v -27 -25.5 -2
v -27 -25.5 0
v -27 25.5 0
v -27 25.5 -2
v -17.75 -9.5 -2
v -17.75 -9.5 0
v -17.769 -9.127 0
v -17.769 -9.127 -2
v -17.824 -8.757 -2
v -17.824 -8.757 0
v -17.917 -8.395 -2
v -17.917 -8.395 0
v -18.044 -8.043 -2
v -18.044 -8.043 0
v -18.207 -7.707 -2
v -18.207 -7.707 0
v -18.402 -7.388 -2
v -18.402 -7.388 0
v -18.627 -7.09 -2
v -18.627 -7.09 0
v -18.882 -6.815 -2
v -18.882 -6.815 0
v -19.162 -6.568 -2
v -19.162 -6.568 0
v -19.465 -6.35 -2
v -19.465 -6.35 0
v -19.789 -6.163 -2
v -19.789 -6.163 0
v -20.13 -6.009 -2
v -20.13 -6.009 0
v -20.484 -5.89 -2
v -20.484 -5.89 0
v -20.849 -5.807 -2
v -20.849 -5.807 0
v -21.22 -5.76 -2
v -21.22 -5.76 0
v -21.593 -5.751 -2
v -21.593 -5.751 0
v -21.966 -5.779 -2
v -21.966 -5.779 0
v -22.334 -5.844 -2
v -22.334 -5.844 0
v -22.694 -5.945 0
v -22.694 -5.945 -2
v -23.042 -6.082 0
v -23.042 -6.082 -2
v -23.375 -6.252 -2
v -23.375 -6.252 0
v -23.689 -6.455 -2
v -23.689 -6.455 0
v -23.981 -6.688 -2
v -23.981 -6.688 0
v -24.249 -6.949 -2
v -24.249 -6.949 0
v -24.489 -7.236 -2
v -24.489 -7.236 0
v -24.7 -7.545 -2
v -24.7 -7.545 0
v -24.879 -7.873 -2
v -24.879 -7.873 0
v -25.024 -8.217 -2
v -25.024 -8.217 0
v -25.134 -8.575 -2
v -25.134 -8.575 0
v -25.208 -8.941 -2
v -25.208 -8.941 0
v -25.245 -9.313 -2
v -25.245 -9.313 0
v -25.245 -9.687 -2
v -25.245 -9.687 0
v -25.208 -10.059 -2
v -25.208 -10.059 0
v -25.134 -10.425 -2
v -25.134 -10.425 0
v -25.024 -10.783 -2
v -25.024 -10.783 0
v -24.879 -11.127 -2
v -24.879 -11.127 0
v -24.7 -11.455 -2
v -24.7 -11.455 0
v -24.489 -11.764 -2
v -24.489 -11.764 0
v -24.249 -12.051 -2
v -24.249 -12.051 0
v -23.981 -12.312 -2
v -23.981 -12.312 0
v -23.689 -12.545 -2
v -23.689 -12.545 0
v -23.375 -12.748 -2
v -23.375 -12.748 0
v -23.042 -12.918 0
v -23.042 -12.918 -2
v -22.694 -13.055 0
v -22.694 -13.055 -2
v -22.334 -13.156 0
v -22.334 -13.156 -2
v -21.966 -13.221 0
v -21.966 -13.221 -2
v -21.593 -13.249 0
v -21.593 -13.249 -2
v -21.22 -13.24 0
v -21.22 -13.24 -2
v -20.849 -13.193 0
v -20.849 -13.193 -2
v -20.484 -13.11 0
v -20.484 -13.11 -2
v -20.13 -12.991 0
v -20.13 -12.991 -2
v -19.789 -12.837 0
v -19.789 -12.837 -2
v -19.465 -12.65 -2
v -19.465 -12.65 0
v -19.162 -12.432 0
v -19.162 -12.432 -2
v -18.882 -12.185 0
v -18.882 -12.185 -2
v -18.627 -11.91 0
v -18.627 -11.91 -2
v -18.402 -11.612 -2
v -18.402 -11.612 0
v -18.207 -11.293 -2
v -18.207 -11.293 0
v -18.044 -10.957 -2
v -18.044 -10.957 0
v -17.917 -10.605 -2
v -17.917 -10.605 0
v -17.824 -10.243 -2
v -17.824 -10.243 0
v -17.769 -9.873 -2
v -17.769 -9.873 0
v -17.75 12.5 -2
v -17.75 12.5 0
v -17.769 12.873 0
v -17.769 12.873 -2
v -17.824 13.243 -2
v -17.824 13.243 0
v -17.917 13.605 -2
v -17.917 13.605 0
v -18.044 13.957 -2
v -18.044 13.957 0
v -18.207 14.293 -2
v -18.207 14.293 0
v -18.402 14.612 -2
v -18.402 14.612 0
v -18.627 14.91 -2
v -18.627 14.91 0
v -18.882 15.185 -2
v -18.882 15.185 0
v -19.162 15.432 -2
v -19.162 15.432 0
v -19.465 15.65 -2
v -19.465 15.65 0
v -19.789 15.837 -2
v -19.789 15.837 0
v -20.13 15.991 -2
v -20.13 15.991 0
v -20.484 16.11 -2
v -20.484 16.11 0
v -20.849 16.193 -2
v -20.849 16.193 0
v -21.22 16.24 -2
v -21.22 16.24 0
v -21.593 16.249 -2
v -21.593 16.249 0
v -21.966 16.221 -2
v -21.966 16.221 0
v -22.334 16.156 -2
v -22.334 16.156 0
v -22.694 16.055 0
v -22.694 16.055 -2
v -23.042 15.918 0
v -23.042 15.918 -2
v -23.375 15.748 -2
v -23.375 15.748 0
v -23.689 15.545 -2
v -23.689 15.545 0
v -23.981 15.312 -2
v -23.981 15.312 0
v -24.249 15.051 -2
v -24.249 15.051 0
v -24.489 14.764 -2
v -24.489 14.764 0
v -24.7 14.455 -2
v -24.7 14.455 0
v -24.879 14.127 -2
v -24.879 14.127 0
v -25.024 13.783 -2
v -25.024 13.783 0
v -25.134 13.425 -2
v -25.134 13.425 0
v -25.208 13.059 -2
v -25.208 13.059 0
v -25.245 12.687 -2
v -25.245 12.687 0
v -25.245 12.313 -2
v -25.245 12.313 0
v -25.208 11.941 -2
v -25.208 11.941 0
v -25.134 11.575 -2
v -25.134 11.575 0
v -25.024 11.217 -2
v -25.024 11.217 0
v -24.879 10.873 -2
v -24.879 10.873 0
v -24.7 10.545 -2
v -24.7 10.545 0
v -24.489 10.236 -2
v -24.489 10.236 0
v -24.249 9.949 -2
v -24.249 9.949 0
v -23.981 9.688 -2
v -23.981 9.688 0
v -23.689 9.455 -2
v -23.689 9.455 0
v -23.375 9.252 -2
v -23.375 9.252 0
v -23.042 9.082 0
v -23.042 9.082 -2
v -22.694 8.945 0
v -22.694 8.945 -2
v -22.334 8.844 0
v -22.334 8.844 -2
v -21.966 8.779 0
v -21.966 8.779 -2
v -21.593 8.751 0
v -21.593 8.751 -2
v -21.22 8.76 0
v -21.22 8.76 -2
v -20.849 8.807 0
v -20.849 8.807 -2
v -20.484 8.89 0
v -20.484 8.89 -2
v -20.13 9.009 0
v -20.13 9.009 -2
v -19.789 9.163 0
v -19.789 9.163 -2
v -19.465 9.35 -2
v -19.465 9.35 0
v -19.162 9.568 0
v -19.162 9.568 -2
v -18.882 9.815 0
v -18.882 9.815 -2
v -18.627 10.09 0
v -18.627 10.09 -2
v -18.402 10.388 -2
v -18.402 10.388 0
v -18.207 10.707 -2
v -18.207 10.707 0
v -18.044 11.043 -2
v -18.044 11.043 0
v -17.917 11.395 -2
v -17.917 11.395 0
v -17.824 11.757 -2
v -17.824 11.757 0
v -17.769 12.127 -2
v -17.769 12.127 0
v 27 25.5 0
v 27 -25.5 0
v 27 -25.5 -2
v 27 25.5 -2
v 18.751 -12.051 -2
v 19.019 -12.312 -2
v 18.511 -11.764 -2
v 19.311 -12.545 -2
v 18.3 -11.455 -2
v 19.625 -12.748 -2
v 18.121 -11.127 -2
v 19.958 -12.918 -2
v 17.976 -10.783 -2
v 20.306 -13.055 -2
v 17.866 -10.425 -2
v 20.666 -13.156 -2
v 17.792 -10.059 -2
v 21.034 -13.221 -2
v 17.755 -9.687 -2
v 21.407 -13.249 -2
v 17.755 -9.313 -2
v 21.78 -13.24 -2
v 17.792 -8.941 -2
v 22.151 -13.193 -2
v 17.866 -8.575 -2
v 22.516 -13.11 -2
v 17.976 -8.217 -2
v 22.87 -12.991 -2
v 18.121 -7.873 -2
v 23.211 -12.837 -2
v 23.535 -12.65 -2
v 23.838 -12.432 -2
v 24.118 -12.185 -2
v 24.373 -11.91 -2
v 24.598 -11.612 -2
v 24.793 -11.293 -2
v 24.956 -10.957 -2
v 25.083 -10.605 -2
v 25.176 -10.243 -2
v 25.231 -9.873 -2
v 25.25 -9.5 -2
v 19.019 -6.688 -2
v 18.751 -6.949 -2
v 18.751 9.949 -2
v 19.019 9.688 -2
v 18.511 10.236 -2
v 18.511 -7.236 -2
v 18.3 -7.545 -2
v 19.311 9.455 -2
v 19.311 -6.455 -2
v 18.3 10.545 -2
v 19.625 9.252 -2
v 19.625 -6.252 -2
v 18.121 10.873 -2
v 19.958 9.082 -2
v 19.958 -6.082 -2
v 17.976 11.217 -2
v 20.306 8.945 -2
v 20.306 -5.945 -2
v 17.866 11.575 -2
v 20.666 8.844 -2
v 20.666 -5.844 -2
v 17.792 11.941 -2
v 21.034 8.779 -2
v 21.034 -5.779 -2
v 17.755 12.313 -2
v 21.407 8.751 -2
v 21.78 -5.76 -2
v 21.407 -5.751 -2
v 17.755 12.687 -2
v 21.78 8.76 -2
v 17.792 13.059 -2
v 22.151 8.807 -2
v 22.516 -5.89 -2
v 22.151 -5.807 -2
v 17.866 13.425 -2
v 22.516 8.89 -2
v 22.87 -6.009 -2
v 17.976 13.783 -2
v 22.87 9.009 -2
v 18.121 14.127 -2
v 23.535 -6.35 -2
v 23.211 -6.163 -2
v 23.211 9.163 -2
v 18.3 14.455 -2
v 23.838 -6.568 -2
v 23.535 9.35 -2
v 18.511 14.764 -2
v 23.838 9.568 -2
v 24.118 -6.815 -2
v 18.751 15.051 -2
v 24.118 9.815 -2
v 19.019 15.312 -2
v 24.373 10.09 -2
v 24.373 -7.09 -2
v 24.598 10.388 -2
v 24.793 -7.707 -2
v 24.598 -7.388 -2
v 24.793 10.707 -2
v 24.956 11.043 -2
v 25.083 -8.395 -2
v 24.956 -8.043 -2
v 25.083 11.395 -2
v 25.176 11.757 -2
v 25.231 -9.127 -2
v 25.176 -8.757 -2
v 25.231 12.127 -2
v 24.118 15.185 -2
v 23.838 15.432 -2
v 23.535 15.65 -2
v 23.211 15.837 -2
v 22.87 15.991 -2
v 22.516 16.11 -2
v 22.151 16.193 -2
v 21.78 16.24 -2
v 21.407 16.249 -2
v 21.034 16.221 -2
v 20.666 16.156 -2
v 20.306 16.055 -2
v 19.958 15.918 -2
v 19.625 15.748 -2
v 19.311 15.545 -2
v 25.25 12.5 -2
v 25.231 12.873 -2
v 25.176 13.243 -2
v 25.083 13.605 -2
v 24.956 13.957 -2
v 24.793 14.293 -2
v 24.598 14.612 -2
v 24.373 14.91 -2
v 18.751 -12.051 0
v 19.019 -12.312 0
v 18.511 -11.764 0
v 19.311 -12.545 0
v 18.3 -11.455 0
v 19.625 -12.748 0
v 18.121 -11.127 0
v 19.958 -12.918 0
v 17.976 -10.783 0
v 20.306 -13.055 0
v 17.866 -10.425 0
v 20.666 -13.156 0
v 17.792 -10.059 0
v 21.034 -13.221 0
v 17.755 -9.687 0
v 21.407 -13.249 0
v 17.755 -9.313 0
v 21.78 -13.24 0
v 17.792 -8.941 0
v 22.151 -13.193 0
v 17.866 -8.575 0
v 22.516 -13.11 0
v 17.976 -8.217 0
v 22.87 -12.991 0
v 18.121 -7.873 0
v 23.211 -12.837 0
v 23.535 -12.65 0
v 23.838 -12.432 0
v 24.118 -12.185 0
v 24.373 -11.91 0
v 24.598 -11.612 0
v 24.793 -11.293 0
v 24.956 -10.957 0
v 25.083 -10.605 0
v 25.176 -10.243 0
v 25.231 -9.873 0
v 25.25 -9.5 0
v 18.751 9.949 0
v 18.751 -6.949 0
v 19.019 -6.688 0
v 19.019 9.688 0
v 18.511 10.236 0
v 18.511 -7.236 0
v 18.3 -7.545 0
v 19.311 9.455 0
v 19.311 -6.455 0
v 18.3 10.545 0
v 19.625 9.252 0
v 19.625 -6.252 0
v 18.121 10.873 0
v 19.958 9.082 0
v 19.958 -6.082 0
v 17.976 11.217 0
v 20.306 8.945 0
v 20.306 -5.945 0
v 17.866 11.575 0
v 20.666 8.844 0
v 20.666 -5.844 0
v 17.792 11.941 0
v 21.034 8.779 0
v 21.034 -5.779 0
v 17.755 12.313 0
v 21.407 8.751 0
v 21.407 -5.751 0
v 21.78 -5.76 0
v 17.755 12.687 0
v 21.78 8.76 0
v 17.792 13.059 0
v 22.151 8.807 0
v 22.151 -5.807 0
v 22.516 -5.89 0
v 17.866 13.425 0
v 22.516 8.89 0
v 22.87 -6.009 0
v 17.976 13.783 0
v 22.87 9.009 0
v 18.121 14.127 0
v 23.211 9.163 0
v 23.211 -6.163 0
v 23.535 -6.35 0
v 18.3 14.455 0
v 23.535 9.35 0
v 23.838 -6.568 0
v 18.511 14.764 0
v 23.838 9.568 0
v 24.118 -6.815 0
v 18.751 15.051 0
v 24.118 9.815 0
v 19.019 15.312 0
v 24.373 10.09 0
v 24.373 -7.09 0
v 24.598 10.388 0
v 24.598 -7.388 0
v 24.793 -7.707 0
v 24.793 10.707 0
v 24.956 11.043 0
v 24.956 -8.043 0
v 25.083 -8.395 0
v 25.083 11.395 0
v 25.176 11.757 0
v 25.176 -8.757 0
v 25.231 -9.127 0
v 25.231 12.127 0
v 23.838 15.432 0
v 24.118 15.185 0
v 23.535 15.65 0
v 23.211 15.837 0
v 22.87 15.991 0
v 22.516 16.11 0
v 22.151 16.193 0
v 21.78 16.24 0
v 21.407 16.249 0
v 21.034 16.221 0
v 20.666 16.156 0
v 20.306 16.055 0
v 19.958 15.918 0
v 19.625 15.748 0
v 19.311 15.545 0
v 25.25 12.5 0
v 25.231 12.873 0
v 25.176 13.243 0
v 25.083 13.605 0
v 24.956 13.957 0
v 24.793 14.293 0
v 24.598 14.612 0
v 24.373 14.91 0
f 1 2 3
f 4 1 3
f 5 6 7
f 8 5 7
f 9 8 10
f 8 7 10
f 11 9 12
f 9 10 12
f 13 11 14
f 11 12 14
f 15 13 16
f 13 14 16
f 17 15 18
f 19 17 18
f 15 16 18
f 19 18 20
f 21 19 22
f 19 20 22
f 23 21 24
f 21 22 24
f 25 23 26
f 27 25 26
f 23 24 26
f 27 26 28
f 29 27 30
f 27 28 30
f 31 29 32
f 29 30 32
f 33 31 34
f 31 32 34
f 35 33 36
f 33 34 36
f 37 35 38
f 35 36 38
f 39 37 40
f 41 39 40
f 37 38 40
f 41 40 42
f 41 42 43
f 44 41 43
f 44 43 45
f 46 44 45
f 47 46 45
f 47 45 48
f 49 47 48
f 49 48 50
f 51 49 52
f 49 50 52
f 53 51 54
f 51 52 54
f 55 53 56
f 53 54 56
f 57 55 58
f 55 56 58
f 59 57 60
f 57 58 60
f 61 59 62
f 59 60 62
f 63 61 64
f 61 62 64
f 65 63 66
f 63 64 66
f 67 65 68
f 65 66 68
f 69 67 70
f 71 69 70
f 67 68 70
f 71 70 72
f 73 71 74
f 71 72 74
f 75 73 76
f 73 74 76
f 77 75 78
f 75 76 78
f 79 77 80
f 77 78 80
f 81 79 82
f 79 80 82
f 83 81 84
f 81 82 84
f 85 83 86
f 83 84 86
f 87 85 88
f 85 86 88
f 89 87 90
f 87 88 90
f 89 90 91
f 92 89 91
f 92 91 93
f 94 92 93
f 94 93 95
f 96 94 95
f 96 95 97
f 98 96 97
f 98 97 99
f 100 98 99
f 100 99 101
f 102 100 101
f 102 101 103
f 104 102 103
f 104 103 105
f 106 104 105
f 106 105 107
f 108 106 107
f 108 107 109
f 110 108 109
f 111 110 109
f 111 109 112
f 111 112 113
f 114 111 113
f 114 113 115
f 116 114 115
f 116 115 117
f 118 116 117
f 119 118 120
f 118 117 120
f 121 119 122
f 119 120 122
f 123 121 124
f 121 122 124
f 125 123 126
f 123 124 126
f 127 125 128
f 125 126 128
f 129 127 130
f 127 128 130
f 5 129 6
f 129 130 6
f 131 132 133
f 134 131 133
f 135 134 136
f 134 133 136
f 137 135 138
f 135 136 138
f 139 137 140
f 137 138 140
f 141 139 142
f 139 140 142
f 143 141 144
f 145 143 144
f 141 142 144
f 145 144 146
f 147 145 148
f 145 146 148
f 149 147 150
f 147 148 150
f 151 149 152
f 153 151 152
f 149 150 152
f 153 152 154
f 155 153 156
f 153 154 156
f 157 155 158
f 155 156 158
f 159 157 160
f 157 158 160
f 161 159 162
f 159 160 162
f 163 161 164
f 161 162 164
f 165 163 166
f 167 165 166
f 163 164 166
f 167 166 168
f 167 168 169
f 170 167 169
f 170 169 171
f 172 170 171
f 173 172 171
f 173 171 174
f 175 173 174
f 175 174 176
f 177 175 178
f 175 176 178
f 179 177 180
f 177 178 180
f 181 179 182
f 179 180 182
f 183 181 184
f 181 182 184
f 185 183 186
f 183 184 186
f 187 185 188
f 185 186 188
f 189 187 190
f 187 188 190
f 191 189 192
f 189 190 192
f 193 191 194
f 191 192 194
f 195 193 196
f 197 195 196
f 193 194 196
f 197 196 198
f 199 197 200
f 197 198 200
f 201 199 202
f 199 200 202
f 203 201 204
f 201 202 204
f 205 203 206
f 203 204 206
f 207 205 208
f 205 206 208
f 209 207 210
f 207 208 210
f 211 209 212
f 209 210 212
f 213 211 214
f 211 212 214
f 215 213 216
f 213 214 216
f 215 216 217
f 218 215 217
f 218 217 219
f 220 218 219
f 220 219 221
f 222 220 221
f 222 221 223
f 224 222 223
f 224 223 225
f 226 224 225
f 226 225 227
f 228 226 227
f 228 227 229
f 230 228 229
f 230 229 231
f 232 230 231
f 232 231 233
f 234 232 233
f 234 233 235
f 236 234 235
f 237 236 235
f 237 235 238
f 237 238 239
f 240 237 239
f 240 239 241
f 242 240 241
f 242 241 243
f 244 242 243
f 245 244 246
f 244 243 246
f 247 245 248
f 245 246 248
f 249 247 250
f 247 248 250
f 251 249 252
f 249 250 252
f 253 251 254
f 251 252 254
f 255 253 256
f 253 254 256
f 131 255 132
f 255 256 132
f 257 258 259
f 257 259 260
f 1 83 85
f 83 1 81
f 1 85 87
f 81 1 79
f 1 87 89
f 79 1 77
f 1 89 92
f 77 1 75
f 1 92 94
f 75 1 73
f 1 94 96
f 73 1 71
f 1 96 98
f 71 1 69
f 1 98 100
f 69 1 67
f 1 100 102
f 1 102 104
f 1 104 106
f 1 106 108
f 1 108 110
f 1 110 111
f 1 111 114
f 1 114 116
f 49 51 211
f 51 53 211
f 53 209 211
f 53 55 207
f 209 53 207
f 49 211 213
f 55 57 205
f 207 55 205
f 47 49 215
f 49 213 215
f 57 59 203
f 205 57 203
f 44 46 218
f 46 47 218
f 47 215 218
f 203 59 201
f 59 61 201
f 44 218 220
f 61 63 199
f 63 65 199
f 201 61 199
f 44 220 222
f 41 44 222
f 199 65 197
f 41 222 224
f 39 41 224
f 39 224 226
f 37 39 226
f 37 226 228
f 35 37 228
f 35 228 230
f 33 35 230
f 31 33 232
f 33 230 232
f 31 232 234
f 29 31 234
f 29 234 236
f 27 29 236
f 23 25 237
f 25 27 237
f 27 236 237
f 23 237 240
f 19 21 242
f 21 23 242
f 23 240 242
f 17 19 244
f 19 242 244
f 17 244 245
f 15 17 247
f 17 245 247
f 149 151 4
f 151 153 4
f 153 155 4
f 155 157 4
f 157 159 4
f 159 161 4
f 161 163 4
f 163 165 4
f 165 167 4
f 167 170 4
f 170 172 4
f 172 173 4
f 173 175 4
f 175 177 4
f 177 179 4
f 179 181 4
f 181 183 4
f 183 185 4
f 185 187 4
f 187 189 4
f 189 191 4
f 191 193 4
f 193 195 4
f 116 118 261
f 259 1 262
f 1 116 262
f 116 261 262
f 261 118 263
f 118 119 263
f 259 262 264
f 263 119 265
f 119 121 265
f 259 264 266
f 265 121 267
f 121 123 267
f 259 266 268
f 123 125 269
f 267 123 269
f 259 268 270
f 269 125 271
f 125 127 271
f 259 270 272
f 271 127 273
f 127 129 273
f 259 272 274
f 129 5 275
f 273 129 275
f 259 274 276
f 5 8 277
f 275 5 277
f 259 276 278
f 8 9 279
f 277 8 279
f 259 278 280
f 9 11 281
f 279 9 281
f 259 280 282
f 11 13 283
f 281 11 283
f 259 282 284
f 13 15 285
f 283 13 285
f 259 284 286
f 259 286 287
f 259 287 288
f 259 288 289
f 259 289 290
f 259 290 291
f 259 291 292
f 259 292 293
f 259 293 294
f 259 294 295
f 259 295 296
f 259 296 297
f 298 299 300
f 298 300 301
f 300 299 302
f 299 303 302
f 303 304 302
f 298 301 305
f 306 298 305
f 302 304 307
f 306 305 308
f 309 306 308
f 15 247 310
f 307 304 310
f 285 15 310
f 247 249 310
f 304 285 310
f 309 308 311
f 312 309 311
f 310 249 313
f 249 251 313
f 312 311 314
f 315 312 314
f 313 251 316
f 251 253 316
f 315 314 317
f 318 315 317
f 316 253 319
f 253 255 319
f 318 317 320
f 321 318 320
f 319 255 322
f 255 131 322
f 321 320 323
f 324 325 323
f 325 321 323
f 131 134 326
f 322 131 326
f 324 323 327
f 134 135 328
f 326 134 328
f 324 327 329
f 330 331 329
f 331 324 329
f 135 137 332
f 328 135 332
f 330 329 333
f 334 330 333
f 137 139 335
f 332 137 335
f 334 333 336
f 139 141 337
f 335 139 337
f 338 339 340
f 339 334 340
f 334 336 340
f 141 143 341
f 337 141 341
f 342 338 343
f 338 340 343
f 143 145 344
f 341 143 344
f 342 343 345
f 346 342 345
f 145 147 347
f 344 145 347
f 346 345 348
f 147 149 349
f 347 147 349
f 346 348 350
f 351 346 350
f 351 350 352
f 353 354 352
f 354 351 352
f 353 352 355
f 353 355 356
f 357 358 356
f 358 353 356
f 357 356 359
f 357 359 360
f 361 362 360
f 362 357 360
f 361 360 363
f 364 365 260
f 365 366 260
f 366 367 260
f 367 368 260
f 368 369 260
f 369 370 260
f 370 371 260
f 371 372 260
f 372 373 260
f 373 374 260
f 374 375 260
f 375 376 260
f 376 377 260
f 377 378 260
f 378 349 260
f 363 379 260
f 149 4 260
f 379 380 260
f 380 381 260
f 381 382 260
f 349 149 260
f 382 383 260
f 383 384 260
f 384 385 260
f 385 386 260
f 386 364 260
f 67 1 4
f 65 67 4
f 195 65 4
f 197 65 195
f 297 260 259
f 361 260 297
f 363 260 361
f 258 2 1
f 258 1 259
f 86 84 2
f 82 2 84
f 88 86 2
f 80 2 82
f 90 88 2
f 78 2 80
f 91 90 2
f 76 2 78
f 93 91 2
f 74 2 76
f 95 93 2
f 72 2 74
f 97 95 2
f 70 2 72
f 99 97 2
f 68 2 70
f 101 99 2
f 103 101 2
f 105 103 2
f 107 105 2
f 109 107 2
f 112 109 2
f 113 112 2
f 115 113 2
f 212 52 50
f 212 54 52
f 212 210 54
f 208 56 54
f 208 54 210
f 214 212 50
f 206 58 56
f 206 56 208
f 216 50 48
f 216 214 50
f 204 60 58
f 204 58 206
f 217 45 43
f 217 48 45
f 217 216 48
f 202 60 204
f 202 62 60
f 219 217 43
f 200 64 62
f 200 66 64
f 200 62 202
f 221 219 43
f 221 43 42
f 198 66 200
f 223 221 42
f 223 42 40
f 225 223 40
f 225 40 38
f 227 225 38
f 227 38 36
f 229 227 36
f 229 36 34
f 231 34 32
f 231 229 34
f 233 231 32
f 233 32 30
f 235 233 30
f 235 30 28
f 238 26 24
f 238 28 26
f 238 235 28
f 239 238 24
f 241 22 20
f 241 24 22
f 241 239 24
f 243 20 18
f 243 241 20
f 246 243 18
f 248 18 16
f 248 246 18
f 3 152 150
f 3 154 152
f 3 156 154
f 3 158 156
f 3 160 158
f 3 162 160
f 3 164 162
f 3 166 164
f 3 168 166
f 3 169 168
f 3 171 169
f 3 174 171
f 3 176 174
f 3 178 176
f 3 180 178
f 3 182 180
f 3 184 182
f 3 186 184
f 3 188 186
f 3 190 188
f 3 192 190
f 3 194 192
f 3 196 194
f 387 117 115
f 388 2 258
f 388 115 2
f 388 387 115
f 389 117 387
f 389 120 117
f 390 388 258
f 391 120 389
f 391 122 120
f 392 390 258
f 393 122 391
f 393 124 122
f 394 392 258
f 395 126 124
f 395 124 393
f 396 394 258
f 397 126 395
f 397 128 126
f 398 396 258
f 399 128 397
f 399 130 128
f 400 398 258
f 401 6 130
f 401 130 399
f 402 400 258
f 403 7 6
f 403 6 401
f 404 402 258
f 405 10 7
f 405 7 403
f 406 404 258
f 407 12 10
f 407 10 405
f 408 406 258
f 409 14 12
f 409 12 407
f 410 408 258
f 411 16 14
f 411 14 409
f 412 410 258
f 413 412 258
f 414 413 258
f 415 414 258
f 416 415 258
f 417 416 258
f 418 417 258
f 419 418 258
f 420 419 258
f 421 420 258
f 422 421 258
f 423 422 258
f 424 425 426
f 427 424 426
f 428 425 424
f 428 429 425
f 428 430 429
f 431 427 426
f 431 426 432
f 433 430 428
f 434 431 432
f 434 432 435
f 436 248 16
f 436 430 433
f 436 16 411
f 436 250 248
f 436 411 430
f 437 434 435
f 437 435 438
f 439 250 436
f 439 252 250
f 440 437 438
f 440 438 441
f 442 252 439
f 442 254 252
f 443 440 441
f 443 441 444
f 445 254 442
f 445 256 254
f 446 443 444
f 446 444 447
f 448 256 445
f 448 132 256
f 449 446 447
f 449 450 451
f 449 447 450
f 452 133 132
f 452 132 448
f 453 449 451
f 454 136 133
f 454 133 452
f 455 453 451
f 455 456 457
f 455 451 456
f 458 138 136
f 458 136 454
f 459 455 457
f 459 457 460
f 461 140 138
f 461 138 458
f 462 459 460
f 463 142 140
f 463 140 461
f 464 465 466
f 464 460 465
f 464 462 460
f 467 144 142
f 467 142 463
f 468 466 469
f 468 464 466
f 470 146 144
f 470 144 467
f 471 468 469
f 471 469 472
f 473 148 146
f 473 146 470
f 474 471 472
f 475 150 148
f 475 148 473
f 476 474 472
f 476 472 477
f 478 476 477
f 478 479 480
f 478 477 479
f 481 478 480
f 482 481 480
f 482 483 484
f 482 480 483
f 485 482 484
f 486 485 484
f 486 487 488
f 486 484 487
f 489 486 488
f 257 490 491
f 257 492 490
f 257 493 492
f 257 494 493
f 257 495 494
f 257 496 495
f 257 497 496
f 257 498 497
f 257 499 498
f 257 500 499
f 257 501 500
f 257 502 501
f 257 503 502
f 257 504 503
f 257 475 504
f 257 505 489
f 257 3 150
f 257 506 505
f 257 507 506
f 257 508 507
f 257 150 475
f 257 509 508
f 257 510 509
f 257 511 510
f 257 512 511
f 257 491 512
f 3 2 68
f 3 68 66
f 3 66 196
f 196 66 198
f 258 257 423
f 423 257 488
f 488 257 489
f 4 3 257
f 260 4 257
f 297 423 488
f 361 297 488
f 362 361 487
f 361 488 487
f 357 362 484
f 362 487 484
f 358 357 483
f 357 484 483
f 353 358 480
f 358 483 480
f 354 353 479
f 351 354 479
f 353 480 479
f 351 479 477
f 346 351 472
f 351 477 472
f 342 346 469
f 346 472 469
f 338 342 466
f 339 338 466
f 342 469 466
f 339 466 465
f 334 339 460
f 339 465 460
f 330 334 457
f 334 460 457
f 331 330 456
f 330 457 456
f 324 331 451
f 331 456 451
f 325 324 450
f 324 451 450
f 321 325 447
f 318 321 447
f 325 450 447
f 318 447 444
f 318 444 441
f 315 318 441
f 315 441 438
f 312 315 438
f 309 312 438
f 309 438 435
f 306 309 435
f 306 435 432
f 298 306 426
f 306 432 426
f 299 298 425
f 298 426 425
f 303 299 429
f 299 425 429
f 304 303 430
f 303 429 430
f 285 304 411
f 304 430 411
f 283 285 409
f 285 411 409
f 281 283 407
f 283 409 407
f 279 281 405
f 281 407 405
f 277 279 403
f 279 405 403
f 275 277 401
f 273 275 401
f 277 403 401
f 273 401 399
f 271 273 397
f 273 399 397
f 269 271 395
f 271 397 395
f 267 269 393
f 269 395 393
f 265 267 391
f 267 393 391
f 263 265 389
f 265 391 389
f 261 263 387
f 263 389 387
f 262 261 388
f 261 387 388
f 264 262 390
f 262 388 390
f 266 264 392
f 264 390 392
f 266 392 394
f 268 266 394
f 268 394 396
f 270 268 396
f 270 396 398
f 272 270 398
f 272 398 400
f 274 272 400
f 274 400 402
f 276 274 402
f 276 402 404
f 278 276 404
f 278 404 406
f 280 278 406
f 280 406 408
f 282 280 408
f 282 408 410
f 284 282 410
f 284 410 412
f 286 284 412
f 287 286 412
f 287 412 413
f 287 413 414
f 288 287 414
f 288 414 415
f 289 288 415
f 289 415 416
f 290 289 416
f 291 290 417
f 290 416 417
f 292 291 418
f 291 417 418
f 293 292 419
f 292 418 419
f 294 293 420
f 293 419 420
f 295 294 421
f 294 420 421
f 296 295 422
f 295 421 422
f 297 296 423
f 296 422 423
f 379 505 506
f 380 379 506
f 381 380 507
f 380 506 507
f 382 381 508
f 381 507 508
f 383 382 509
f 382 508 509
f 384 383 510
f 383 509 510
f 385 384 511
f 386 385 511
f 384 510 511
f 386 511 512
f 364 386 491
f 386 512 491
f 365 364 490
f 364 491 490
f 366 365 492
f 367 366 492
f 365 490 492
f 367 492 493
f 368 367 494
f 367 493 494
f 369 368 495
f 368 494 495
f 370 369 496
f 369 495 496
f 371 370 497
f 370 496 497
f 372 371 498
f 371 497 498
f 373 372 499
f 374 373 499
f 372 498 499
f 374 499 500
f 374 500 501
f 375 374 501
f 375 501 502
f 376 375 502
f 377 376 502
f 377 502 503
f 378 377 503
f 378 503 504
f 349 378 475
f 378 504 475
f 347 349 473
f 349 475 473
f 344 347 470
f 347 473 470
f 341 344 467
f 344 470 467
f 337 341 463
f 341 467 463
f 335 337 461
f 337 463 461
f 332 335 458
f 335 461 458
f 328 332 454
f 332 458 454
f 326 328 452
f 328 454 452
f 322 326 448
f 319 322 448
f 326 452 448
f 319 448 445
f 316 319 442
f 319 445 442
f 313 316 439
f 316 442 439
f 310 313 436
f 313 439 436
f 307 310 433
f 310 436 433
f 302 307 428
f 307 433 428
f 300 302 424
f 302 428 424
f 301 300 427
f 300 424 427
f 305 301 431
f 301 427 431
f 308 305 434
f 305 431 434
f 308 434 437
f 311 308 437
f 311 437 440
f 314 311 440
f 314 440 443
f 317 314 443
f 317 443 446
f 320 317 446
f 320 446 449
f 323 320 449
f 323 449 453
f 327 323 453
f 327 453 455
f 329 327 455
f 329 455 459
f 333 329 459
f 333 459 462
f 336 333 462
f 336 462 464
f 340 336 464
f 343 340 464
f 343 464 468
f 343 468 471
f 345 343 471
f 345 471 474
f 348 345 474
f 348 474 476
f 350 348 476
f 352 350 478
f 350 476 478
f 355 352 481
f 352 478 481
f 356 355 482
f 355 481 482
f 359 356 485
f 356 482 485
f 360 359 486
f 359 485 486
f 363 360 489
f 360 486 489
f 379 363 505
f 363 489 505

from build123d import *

# Parameters (mm, degrees)
CROQUIS1_W              = 54
CROQUIS1_H              = 51
CROQUIS1_R              = 3.75
SALIENTE_EXTRUIR1_DEPTH = 2


with BuildPart() as part:
    # Croquis1 → Saliente-Extruir1 (new body)
    with BuildSketch(Plane.XY):
        Rectangle(CROQUIS1_W, CROQUIS1_H)
        with Locations((-21.5, 12.5)):
            Circle(CROQUIS1_R, mode=Mode.SUBTRACT)
        with Locations((21.5, 12.5)):
            Circle(CROQUIS1_R, mode=Mode.SUBTRACT)
        with Locations((21.5, -9.5)):
            Circle(CROQUIS1_R, mode=Mode.SUBTRACT)
        with Locations((-21.5, -9.5)):
            Circle(CROQUIS1_R, mode=Mode.SUBTRACT)
    extrude(amount=-SALIENTE_EXTRUIR1_DEPTH)


solid = part.part
